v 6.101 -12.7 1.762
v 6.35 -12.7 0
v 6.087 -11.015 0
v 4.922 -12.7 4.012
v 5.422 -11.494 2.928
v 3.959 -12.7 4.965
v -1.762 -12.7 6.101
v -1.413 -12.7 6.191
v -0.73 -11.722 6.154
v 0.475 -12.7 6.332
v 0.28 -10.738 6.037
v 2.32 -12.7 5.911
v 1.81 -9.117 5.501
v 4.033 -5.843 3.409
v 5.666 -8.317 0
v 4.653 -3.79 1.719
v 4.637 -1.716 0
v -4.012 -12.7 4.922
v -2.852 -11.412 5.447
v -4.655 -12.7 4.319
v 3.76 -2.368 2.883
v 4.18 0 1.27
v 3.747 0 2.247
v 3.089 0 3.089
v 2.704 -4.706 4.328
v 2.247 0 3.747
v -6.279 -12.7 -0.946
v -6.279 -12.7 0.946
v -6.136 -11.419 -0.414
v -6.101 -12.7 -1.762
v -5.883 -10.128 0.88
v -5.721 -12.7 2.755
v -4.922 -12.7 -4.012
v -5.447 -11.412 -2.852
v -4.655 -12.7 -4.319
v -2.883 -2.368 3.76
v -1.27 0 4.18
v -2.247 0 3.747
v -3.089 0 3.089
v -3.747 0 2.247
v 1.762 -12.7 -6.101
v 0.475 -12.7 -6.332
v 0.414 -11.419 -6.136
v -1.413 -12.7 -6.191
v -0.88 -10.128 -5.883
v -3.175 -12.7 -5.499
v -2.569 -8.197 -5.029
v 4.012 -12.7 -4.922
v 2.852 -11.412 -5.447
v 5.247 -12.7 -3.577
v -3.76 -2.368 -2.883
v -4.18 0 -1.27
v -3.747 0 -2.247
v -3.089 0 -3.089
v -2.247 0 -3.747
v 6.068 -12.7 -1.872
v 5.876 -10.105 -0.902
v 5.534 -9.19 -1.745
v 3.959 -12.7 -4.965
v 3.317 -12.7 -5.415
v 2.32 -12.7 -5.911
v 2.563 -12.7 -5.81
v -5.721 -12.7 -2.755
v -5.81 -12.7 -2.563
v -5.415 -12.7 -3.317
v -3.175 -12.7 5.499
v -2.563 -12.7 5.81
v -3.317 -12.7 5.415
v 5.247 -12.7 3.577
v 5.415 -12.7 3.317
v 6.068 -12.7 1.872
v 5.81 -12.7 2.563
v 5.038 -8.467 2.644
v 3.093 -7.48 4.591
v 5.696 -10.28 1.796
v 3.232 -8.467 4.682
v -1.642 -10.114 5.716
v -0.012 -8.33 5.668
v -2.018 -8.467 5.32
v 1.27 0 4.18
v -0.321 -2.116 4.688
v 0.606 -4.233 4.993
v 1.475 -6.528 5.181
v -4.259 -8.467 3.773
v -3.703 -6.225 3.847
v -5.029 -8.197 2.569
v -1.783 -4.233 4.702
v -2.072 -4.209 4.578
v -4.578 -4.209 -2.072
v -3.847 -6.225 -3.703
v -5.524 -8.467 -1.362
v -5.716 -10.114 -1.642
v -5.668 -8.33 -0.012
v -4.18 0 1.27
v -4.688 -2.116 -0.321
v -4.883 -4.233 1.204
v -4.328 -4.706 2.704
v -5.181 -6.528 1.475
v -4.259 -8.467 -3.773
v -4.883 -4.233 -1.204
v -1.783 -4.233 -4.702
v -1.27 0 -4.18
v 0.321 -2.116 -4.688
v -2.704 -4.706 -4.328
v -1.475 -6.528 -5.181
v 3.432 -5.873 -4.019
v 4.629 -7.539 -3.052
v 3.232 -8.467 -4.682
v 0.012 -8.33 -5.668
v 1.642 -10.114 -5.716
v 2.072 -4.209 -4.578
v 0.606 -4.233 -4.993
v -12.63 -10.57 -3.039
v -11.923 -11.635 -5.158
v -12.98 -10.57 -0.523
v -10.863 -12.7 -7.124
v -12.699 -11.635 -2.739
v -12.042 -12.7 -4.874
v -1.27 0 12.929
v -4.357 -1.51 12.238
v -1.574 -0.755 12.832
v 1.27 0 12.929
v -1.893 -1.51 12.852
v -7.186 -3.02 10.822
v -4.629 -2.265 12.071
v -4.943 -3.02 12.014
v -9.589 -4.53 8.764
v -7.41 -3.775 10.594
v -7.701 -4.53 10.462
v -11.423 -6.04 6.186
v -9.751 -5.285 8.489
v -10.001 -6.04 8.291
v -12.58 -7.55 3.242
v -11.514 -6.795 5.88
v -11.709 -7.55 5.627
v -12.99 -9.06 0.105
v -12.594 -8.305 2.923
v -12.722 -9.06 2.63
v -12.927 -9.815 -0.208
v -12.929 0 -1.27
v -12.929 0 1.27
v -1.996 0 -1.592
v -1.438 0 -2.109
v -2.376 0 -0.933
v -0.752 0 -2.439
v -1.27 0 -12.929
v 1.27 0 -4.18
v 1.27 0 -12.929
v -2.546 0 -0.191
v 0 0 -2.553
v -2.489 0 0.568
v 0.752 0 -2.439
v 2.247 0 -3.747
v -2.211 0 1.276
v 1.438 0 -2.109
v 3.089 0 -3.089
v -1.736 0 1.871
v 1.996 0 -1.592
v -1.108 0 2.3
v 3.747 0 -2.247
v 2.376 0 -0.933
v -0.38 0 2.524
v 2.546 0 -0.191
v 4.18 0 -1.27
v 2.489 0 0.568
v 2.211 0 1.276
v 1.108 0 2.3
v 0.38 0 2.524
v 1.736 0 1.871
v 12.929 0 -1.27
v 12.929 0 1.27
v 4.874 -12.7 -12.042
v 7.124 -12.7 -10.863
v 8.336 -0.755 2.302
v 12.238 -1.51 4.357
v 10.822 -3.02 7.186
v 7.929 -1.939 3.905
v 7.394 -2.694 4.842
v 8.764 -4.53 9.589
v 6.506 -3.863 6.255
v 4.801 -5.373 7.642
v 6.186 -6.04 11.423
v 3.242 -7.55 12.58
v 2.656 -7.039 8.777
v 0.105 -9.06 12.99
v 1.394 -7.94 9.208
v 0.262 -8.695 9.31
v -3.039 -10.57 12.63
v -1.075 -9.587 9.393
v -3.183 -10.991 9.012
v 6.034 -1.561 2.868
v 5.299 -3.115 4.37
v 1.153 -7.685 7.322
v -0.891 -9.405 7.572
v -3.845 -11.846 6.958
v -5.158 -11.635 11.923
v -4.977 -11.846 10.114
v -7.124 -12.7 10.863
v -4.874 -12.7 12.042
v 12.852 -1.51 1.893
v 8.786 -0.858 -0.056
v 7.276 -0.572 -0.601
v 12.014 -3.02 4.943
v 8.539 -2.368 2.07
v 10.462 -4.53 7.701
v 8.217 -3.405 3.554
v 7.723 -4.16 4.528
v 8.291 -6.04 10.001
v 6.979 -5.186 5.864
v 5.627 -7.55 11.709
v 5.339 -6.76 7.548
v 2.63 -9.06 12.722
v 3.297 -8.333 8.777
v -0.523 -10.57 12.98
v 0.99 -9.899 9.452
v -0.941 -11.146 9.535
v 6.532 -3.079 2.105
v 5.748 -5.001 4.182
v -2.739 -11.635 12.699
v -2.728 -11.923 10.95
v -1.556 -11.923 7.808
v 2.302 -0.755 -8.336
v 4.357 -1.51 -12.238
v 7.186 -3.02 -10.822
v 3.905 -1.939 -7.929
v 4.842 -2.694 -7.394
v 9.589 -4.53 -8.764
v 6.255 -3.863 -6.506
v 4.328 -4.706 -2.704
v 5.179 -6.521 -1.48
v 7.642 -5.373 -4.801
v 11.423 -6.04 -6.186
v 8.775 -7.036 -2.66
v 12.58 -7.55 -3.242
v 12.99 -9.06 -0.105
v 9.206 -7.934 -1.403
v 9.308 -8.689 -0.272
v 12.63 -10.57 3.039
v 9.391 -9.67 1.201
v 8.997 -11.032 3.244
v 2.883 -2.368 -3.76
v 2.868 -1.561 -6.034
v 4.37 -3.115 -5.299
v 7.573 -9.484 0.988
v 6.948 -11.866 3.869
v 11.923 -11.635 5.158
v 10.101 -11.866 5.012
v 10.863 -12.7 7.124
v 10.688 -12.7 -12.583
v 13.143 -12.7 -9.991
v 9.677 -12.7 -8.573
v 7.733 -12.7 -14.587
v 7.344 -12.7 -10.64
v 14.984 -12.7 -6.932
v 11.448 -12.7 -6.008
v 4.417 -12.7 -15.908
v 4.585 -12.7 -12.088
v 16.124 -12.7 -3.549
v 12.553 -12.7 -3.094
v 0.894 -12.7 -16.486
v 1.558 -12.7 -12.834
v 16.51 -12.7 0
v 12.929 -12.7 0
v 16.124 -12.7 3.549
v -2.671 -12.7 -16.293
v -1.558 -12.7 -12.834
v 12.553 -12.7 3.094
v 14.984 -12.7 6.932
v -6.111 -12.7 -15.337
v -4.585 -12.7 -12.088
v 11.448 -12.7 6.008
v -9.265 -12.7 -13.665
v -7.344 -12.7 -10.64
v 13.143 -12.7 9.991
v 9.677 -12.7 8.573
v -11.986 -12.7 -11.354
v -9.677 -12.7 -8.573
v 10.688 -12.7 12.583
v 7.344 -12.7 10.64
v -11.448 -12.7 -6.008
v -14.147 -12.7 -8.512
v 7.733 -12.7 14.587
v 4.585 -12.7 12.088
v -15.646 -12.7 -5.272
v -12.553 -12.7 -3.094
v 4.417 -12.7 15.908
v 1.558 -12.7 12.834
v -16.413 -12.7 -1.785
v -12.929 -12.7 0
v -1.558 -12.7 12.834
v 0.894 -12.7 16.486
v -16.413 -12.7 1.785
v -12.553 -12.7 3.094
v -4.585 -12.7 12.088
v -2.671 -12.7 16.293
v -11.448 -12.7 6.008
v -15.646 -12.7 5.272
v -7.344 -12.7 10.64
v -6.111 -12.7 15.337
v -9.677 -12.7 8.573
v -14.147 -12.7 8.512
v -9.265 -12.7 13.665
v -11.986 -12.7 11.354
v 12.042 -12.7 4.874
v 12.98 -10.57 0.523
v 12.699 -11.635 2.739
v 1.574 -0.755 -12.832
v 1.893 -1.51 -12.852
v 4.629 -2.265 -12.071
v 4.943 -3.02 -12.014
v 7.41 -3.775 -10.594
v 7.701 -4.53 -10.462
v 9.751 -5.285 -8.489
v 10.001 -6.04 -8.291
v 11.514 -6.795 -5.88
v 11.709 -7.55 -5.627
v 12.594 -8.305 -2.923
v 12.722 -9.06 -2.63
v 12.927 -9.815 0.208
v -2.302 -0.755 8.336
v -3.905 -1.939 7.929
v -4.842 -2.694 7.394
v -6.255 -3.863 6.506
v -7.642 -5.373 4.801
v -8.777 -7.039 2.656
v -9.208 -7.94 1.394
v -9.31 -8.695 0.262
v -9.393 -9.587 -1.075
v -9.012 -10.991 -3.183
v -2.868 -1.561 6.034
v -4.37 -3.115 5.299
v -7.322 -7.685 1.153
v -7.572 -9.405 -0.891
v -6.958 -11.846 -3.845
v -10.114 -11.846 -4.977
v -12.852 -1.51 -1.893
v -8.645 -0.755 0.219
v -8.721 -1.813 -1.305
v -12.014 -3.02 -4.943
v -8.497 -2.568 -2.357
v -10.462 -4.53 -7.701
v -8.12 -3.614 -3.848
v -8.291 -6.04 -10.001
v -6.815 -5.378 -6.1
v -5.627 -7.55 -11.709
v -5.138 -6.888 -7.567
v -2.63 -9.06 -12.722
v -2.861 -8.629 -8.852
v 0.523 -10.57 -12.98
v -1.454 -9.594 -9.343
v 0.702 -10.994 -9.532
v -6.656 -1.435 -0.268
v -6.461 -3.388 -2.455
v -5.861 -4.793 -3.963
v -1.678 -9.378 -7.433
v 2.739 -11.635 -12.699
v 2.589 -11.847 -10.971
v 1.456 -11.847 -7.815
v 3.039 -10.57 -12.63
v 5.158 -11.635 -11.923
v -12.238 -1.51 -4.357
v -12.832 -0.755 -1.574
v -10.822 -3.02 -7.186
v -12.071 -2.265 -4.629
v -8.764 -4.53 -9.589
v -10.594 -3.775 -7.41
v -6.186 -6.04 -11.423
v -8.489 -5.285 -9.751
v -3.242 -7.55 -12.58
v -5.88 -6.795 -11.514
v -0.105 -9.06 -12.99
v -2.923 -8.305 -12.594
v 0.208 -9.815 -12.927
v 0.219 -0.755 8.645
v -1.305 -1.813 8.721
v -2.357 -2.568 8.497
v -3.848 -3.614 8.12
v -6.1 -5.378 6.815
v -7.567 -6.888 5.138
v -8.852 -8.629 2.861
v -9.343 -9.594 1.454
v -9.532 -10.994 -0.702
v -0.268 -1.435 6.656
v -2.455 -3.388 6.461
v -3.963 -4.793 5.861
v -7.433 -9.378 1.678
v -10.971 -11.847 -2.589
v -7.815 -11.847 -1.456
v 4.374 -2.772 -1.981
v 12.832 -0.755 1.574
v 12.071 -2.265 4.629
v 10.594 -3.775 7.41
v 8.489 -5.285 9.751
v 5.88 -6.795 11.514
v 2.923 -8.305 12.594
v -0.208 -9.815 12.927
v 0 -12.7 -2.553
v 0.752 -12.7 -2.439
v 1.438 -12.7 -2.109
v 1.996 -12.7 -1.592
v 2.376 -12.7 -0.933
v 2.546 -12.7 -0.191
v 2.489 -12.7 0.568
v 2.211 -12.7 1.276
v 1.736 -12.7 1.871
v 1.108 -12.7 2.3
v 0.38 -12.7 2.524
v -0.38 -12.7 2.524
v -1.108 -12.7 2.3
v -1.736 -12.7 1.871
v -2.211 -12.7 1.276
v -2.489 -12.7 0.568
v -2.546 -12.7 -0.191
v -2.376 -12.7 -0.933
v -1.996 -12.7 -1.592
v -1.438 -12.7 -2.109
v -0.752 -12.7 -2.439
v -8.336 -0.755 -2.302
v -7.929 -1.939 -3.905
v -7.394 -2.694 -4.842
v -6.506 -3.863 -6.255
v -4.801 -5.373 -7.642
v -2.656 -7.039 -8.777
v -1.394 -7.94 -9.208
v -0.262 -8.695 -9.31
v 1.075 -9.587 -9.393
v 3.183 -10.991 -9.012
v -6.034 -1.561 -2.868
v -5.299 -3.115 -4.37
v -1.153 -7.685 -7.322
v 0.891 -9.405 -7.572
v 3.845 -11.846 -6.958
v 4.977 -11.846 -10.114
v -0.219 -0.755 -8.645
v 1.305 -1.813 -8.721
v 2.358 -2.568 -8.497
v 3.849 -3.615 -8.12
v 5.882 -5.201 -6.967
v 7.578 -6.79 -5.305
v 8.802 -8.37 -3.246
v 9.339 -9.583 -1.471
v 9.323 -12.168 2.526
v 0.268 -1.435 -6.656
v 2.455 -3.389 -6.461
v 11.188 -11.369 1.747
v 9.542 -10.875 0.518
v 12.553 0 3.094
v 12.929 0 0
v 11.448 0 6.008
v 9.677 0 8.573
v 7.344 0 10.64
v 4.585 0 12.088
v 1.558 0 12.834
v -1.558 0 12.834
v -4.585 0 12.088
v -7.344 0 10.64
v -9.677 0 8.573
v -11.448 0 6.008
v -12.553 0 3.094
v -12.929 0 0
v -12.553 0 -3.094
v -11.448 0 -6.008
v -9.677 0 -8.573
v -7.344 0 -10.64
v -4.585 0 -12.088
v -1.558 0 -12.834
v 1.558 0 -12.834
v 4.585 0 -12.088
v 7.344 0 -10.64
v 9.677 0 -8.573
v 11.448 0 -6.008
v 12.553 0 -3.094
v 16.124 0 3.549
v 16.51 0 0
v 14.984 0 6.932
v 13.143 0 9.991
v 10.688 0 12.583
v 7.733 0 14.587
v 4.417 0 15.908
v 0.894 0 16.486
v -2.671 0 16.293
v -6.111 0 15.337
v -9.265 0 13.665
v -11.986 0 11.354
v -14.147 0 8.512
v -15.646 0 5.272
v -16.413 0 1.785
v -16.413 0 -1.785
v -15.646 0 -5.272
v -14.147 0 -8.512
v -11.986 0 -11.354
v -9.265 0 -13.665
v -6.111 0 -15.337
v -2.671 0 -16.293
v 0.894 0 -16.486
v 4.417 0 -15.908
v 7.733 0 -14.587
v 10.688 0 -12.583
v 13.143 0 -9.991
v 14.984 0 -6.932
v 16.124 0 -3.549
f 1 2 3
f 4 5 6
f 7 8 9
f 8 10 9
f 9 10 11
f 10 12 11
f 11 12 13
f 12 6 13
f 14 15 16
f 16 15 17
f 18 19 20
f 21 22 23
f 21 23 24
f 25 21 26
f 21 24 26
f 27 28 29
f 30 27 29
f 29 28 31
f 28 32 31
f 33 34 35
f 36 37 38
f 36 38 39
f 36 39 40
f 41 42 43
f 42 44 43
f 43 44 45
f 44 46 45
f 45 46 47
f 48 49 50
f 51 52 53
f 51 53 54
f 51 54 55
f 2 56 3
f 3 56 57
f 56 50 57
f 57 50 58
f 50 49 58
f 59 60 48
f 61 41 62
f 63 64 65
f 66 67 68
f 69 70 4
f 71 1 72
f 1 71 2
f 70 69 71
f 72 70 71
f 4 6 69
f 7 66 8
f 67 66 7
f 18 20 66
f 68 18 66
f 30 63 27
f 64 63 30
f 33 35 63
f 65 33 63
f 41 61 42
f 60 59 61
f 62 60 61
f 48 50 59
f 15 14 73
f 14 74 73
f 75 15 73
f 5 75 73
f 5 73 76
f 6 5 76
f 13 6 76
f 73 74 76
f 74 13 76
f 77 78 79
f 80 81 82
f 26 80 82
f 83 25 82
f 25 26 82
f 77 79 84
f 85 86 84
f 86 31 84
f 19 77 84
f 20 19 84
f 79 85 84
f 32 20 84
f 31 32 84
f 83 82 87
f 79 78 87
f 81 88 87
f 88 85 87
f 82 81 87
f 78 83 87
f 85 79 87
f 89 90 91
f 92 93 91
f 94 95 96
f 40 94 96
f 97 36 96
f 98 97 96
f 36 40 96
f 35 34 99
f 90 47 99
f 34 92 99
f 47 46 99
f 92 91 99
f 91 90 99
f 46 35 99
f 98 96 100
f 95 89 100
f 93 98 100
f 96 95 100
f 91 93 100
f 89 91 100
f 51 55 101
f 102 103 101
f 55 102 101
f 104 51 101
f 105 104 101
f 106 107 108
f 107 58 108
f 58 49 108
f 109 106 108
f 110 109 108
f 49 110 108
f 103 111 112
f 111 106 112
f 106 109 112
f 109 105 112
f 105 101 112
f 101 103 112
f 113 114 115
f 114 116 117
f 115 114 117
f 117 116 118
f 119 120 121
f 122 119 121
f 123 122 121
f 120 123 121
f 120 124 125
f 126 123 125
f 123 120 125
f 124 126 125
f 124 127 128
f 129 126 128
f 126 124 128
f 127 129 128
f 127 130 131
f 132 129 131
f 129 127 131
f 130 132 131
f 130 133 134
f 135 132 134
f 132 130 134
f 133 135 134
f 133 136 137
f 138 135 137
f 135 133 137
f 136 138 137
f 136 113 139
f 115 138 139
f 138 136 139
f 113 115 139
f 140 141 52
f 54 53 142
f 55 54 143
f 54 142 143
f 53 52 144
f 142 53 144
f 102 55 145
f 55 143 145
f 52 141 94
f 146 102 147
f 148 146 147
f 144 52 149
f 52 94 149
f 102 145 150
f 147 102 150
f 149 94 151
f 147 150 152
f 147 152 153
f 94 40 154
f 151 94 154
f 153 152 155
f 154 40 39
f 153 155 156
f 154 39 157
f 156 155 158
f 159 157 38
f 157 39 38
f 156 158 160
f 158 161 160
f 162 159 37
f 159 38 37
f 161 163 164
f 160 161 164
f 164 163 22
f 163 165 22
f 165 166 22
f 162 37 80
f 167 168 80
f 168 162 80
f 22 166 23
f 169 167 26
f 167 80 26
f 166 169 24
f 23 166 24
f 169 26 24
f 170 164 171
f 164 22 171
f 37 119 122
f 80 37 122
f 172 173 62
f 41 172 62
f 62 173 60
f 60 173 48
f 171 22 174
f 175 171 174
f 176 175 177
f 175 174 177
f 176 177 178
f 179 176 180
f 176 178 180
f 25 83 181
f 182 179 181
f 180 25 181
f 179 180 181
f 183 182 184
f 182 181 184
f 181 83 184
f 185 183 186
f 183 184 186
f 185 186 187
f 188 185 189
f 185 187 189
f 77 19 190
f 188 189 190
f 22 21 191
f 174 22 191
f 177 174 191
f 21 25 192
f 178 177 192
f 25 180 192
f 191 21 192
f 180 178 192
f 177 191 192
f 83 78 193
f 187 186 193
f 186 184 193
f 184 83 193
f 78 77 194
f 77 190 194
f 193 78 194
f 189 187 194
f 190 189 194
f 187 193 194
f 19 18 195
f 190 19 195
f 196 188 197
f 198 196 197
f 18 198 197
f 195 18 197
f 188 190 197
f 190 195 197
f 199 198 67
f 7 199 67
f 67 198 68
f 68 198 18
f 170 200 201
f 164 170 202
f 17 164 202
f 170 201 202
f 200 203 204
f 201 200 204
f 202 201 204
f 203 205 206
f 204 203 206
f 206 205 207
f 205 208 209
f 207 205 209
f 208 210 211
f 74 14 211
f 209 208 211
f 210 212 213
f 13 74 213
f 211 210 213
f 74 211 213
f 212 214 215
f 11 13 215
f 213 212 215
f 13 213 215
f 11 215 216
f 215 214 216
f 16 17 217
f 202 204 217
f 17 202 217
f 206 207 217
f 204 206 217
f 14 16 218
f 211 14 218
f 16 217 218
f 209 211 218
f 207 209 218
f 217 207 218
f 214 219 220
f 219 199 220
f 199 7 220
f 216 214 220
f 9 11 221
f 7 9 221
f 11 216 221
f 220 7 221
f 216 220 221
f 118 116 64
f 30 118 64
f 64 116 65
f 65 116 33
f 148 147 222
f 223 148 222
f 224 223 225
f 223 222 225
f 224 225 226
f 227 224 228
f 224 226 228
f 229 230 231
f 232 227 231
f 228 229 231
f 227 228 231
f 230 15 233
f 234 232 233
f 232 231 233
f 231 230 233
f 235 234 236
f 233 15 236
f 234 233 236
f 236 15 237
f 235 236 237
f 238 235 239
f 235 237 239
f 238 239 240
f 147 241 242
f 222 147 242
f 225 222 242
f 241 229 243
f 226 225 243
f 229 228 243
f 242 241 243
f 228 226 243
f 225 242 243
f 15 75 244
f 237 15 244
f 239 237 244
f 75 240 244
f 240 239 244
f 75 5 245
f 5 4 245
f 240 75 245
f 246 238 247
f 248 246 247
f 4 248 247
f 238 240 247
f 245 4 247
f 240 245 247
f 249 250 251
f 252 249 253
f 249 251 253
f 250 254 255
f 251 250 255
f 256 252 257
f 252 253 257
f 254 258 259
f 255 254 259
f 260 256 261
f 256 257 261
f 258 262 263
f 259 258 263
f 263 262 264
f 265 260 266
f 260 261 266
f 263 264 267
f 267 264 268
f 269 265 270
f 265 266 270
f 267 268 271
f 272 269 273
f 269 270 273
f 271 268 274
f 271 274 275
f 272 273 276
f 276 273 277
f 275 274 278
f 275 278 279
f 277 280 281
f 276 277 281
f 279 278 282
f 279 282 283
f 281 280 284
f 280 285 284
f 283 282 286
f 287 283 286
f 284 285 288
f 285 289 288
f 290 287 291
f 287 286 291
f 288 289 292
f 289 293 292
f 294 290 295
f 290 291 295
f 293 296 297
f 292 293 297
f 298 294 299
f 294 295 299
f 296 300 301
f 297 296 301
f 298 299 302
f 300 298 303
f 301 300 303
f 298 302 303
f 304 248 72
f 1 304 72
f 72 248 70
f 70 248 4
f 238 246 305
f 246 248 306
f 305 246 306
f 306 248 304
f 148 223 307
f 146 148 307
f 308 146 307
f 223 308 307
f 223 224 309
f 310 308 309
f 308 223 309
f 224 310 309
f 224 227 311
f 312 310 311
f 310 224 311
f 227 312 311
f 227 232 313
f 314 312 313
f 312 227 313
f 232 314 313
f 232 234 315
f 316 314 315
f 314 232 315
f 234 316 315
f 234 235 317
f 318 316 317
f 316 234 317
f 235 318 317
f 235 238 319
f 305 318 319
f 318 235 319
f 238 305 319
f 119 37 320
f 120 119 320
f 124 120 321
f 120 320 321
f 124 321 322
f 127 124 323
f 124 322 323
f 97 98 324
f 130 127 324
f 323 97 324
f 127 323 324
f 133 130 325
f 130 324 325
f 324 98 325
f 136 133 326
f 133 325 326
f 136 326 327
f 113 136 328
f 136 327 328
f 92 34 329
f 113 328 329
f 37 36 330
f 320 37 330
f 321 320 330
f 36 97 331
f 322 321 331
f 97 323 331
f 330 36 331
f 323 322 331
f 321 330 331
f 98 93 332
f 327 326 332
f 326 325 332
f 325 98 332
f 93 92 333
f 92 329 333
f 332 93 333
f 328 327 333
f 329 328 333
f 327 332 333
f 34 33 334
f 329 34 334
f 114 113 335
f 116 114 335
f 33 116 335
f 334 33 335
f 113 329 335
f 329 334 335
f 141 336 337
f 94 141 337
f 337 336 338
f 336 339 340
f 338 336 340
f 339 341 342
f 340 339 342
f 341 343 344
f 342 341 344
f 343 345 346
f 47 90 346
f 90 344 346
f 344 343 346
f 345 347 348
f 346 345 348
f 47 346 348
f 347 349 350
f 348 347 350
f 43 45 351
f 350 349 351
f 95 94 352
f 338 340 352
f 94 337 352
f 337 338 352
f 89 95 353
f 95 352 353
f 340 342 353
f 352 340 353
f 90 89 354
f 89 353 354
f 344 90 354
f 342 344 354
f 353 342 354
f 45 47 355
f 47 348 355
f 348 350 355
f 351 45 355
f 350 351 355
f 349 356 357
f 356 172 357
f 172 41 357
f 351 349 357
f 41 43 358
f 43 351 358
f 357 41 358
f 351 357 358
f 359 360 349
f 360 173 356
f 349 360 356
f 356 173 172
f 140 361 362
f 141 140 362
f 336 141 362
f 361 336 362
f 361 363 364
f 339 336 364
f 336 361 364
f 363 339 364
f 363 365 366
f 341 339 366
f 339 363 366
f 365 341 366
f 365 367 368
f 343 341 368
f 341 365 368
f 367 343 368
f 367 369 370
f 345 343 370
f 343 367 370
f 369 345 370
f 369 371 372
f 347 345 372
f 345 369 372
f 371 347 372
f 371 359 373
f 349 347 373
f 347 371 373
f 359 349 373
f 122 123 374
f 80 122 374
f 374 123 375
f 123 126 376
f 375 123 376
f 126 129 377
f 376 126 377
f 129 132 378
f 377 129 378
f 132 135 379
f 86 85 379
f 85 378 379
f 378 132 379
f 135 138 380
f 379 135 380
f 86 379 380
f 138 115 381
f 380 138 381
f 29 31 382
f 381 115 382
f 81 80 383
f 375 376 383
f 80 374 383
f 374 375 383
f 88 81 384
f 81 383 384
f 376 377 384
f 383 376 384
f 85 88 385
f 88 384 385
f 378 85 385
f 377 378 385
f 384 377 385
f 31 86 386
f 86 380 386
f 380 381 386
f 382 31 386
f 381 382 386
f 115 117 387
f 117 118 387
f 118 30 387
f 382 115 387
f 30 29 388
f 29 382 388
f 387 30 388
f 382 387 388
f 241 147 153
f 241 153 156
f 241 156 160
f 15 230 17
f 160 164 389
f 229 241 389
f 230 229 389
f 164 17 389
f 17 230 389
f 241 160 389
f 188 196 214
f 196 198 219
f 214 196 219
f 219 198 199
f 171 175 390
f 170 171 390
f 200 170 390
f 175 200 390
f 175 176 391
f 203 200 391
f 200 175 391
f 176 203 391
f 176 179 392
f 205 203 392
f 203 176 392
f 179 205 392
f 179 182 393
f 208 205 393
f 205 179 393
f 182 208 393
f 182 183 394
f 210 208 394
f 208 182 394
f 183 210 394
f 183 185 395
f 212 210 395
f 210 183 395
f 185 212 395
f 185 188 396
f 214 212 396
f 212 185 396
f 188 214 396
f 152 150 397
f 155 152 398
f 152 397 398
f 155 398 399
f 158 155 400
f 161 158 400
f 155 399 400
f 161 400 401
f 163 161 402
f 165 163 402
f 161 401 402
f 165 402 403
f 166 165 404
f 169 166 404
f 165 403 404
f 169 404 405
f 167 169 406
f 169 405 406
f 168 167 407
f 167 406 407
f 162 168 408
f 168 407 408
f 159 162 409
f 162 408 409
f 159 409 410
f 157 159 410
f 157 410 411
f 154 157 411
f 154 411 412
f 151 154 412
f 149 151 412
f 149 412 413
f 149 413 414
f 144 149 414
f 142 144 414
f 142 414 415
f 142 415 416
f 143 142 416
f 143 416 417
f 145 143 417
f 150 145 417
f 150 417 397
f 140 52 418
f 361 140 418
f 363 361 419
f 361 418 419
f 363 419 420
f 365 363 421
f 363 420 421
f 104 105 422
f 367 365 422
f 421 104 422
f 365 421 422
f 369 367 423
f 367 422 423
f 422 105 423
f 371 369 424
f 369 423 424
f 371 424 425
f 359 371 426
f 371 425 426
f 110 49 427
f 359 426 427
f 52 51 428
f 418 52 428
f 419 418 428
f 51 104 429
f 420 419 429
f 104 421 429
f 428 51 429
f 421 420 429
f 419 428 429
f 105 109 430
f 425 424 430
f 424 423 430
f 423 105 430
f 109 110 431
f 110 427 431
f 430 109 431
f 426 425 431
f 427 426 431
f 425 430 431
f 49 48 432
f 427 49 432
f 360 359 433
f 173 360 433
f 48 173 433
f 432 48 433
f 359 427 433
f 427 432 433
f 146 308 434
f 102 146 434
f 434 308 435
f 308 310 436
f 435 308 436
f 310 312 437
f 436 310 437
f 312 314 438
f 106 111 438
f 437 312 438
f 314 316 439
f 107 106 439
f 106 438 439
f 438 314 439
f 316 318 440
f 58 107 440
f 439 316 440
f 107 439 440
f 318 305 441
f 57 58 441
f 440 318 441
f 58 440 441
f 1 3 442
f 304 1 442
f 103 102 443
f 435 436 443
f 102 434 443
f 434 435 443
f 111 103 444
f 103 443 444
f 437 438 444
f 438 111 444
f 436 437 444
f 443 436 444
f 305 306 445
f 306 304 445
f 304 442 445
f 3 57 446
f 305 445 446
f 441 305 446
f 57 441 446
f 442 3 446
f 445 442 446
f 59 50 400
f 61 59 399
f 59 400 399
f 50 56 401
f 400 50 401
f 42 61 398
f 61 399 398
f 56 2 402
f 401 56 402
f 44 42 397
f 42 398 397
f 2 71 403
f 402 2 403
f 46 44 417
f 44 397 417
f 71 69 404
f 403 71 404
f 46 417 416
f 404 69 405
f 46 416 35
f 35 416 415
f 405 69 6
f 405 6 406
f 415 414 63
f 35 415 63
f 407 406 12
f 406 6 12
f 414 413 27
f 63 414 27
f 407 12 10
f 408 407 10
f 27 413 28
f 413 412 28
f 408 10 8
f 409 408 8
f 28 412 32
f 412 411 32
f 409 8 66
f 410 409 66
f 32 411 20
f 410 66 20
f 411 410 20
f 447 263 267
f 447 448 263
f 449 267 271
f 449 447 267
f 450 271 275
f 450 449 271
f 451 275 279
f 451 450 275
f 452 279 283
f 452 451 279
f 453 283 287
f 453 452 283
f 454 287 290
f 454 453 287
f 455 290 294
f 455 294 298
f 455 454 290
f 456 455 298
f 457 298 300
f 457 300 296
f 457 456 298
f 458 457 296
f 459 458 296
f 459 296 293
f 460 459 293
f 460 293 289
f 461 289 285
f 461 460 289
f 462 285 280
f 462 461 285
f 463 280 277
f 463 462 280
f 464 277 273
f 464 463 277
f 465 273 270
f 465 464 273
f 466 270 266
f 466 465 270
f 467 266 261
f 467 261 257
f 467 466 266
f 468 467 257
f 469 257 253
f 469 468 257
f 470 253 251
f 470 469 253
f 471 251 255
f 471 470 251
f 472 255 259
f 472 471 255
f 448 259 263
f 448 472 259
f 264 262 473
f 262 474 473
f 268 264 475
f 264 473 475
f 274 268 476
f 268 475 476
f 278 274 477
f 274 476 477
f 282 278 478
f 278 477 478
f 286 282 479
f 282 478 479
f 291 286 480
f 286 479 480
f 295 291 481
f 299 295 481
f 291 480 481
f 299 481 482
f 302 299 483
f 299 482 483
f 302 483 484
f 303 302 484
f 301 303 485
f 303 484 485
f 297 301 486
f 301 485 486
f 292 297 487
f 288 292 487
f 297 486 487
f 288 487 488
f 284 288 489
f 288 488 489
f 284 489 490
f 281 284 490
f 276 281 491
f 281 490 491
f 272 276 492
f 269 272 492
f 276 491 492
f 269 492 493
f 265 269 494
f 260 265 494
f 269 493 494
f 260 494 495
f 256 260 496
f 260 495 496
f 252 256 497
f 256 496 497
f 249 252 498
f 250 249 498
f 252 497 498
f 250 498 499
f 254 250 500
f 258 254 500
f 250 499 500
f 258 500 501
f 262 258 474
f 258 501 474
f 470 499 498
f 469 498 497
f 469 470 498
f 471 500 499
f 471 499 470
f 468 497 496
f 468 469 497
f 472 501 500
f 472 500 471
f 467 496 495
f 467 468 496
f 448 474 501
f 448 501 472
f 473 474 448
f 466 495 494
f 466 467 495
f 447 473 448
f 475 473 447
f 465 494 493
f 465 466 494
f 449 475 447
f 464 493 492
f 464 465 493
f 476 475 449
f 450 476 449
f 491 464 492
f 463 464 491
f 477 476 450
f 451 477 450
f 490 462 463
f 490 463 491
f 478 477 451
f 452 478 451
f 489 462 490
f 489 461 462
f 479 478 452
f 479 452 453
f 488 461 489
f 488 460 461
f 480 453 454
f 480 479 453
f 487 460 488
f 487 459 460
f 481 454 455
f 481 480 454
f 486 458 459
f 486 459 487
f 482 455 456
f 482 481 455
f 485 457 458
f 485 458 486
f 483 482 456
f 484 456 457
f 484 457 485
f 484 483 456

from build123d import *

# Parameters (mm, degrees)
SWEEP1_PITCH           = 38.862
SWEEP1_HEIGHT          = 12.7
SWEEP1_RADIUS          = 12.9286
SWEEP1_START_ANGLE     = 180
SKETCH2_W              = 2.54
SKETCH2_H              = 12.9286
CIRPATTERN1_COUNT      = 4
F_10_CLEARANCE_HOLE1_D = 5.1054
SKETCH11_W             = 3.5814
SKETCH11_H             = 12.7


with BuildPart() as part:
    # Sweep1: sweep along a helix
    with BuildLine() as sweep1_path:
        add(Helix(SWEEP1_PITCH, SWEEP1_HEIGHT, SWEEP1_RADIUS, center=(0, 0, 0), direction=(0, -1, 0), mode=Mode.PRIVATE).rotate(Axis((0, 0, 0), (0, -1, 0)), SWEEP1_START_ANGLE))
    # Sketch2 → Sweep1 (sweep)
    with BuildSketch(Plane(origin=(0, 0, 0), x_dir=(1, 0, 0), z_dir=(0, 1, 0))):
        with Locations((0, -6.4643)):
            Rectangle(SKETCH2_W, SKETCH2_H)
    sweep1 = sweep(path=sweep1_path.line, is_frenet=True)

    # Sketch4 → Revolve1 (revolve)
    with BuildSketch(Plane.XY):
        Polygon((0, 0), (0, -12.700196986), (6.35, -12.700196986), (4.3688, 0), align=None)
    revolve(axis=Axis((0, 0, 0), (0, -1, 0)))

    # CirPattern1: Sweep1 ×4 about axis
    cirpattern1_axis = Axis((0, 28.922533895, 0), (0, -1, 0))
    for i in range(1, CIRPATTERN1_COUNT):
        add(sweep1.rotate(cirpattern1_axis, i * 360 / CIRPATTERN1_COUNT))

    # #10 Clearance Hole1 (through all)
    with Locations(Plane.ZX):
        with Locations((0, 0)):
            Hole(F_10_CLEARANCE_HOLE1_D / 2)


with BuildPart() as body_2:
    # Sketch11 → Revolve2 (revolve)
    with BuildSketch(Plane.XY):
        with Locations((14.7193, -6.35)):
            Rectangle(SKETCH11_W, SKETCH11_H)
    revolve(axis=Axis((0, 28.922533895, 0), (0, -1, 0)))


solid = Compound([part.part, body_2.part])
